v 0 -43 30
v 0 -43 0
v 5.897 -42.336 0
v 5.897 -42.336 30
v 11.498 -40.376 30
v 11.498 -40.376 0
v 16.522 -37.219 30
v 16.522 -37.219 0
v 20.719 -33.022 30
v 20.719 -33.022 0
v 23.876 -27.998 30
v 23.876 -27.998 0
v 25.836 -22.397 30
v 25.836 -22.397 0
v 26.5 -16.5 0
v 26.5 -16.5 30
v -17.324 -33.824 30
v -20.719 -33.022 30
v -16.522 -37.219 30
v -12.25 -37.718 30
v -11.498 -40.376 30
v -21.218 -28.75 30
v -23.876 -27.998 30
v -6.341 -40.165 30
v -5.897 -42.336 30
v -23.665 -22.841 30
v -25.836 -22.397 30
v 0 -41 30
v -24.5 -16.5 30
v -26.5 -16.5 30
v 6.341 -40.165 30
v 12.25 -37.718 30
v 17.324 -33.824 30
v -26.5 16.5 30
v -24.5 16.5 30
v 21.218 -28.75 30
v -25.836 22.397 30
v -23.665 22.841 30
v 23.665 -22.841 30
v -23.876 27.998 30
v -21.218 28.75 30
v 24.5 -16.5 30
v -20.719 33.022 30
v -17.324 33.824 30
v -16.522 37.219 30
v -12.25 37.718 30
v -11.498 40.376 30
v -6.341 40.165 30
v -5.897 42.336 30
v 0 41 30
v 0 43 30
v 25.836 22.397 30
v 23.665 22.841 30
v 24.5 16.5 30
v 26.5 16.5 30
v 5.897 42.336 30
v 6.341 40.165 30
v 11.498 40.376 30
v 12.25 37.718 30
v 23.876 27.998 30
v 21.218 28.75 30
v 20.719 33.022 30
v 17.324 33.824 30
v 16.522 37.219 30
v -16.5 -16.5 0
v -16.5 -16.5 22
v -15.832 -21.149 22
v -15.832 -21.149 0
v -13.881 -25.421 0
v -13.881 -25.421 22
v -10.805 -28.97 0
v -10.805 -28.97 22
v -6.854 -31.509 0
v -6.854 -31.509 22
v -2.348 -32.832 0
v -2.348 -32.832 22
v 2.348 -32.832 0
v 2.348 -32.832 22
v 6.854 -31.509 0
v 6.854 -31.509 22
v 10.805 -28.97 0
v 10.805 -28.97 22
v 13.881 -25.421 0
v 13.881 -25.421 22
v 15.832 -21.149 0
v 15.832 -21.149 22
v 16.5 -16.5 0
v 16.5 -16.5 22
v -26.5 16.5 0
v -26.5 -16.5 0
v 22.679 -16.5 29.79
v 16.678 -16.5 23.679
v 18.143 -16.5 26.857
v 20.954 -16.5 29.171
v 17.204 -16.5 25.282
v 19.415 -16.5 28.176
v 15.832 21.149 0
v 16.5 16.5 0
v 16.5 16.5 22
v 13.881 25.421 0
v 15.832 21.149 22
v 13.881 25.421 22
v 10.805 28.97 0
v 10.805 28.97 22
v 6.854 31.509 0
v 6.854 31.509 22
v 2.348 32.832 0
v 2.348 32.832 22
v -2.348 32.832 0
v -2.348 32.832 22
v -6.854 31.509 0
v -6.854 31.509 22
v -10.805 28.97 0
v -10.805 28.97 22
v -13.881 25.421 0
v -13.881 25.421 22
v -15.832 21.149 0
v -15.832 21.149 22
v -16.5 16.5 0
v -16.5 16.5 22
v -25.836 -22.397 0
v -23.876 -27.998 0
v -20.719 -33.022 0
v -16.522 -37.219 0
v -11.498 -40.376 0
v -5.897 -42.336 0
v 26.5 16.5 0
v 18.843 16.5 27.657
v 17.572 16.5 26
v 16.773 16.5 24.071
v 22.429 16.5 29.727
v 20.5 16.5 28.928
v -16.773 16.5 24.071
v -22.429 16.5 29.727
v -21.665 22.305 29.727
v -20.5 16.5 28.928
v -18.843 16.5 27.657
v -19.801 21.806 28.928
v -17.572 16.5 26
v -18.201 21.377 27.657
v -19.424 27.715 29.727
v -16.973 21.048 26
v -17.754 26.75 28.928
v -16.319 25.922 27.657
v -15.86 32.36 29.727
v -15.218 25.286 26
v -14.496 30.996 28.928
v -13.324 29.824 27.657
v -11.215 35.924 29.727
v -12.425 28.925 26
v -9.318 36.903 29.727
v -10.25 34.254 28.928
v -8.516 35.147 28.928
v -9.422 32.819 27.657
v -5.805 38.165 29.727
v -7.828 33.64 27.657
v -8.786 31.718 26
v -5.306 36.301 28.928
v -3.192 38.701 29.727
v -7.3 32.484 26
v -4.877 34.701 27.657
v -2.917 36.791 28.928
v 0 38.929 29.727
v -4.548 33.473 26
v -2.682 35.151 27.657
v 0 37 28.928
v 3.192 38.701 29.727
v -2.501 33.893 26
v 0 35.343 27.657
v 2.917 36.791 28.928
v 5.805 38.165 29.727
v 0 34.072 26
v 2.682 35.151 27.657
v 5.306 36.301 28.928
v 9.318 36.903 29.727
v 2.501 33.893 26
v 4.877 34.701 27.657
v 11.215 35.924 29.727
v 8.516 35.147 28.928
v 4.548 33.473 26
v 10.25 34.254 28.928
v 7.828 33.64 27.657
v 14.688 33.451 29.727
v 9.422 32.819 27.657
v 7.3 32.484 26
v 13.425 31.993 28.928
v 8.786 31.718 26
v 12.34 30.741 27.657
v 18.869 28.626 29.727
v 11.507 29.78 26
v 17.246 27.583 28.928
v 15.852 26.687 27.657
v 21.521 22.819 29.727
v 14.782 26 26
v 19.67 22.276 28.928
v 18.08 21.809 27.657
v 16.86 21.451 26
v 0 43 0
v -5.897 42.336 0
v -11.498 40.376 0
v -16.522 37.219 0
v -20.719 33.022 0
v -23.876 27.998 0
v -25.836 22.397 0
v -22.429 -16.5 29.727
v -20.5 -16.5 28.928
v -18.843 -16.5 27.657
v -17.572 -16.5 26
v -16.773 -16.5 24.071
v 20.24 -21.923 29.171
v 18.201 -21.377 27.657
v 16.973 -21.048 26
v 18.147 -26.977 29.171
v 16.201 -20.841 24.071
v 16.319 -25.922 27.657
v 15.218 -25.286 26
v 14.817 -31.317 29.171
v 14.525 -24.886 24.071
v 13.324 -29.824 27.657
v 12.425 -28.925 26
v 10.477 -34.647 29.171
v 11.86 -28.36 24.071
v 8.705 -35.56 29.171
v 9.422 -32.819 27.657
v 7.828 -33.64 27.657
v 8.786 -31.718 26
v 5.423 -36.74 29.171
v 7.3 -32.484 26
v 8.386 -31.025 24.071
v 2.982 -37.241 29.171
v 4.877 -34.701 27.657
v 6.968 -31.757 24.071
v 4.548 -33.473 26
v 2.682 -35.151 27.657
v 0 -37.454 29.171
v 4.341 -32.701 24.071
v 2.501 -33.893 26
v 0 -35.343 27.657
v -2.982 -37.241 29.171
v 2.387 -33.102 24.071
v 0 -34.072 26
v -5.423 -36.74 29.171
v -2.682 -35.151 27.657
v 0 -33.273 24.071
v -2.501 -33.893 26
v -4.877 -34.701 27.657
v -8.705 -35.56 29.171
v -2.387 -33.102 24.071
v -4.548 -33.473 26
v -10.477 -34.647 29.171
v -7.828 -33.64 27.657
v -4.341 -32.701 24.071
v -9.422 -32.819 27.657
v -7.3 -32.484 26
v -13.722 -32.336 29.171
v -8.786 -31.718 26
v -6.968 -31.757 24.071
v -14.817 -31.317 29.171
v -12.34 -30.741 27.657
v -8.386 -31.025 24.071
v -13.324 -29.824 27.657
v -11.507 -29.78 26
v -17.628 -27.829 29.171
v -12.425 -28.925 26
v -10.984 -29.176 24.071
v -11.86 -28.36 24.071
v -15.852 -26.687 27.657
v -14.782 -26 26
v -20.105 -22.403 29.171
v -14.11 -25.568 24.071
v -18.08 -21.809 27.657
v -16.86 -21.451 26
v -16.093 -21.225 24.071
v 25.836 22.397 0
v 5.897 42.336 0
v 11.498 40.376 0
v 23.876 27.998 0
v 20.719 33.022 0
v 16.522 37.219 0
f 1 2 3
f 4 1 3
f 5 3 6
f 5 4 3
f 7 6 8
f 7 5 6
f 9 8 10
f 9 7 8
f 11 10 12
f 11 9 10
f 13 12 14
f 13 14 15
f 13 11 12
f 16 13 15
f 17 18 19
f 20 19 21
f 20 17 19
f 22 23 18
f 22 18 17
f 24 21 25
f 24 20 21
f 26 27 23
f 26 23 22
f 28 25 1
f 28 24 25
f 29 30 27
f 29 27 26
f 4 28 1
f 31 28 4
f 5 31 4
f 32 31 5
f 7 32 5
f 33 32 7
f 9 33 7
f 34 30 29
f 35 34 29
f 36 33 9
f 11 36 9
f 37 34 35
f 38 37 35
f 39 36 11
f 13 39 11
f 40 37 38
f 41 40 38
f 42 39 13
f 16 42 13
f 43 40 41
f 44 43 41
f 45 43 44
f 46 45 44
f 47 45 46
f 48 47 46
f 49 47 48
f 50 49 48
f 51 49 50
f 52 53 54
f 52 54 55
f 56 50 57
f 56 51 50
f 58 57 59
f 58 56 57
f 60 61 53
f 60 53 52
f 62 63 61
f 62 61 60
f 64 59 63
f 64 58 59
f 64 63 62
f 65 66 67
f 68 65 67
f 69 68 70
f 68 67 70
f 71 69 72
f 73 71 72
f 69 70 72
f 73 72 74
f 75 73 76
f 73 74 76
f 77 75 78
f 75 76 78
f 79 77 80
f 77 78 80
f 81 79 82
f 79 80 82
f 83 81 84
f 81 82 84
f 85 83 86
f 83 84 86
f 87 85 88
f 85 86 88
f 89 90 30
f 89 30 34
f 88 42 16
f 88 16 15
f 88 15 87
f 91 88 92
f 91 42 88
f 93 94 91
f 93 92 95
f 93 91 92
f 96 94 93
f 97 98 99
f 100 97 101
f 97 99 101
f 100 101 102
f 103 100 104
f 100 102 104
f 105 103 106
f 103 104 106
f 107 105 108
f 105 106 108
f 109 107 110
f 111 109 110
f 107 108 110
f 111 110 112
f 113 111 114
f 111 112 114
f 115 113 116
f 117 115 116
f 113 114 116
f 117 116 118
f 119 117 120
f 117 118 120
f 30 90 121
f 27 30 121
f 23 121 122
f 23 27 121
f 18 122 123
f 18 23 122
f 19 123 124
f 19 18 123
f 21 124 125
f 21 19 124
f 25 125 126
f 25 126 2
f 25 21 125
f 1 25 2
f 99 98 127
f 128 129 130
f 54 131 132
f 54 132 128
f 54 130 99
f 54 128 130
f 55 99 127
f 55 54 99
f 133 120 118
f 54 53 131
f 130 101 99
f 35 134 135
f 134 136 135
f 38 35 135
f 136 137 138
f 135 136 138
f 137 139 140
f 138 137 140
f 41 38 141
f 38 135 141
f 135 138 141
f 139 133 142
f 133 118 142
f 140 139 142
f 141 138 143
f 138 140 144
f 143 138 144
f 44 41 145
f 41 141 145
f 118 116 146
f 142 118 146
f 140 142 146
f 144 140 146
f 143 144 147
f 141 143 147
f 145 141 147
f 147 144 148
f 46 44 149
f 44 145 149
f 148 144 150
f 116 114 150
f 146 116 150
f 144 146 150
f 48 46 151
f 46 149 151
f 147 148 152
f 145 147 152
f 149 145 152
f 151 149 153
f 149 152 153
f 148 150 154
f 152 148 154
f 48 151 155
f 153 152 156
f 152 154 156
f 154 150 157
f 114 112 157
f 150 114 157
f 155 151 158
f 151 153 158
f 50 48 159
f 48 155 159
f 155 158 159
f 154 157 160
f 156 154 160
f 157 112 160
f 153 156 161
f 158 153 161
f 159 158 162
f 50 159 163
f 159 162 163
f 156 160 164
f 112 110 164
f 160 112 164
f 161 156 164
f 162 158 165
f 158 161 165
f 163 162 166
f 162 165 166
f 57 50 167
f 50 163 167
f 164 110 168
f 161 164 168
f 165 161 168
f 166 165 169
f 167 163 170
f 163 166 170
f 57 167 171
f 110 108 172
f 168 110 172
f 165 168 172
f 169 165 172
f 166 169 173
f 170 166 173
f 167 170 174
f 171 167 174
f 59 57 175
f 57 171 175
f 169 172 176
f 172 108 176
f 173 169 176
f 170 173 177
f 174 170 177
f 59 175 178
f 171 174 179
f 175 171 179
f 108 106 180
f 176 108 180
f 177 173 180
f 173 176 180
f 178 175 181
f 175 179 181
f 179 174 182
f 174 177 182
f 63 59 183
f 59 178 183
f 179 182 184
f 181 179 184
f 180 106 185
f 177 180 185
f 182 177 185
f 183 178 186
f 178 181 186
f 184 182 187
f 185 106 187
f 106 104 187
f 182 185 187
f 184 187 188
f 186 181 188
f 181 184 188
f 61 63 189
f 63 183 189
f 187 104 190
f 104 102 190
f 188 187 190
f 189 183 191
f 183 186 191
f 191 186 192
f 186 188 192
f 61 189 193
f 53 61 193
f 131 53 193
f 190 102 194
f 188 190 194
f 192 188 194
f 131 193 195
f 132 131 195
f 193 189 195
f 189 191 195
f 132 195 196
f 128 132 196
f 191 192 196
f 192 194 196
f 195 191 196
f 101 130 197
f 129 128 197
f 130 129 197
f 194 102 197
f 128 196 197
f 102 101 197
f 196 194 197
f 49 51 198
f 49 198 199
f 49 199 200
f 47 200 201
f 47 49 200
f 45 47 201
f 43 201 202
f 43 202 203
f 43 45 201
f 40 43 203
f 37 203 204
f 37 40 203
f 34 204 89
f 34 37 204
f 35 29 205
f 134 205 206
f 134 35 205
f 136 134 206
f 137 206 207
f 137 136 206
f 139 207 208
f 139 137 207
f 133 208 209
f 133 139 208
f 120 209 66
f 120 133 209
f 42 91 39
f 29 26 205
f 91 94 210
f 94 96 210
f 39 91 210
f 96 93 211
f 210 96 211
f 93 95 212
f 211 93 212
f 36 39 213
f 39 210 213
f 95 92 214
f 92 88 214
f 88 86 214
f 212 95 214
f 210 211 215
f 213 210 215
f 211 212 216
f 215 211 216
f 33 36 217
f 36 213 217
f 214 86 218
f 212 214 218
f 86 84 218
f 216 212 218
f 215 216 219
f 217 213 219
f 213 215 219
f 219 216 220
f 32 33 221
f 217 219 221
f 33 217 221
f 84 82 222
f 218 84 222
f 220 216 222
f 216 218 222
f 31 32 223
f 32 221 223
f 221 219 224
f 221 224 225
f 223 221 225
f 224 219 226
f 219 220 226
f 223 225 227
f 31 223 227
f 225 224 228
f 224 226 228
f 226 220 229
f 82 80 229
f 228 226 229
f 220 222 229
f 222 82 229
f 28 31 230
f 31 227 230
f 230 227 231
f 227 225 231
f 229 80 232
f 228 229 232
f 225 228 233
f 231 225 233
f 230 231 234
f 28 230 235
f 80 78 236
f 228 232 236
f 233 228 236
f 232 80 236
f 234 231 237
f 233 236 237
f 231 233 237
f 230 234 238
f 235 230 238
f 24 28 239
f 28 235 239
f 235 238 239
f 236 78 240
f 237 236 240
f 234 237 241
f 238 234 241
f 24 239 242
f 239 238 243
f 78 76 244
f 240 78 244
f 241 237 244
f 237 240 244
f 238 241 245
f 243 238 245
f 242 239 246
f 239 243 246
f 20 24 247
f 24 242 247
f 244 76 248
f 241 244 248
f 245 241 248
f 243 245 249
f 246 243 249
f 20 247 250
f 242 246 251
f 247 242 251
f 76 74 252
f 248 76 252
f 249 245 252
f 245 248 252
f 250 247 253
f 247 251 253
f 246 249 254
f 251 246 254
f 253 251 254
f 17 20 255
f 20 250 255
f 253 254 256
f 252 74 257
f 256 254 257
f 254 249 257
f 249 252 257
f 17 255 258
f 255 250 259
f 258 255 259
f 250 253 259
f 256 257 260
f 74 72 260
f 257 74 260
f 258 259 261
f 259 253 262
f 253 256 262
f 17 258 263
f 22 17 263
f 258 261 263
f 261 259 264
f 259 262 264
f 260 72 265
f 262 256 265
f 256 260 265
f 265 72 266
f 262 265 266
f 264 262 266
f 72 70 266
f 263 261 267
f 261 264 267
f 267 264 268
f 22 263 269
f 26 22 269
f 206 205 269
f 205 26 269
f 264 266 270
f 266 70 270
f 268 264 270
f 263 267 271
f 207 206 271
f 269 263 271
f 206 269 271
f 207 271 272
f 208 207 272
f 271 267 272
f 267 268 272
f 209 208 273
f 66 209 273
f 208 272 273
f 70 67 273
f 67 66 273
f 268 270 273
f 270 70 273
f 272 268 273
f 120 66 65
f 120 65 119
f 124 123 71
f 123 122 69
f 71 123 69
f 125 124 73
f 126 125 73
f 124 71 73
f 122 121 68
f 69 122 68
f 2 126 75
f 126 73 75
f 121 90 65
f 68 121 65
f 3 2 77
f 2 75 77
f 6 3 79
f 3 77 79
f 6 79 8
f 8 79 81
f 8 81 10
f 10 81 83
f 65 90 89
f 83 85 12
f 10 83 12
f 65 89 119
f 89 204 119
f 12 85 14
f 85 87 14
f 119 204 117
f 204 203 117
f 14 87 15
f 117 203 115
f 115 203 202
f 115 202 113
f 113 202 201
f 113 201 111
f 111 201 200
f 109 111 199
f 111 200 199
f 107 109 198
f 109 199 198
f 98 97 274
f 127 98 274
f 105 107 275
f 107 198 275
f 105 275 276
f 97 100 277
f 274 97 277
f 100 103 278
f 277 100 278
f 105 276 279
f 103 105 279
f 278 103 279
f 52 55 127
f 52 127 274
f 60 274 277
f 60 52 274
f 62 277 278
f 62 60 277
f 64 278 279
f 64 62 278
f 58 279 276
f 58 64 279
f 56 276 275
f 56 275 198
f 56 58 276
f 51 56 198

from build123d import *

# Parameters (mm, degrees)
SKETCH_W        = 53
SKETCH_H        = 86
PAD_DEPTH       = 30
POCKET_DEPTH    = 30
POCKET001_DEPTH = 30
POCKET002_DEPTH = 30
POCKET003_DEPTH = 30
POCKET004_DEPTH = 30
FILLET_R        = 8


with BuildPart() as part:
    # Sketch → Pad (new body)
    with BuildSketch(Plane.XY):
        Rectangle(SKETCH_W, SKETCH_H)
    extrude(amount=PAD_DEPTH)

    # Sketch001 (on Face6 of Pad) → Pocket (cut)
    with BuildSketch(Plane.XY.offset(30)):
        with BuildLine():
            ThreePointArc((16.5, 16.5), (0, 33), (-16.5, 16.5))
            Line((-16.5, -16.499996), (-16.5, 16.5))
            ThreePointArc((-16.5, -16.499996), (0, -33), (16.5, -16.499996))
            Line((26.5, -16.499996), (16.5, -16.499996))
            Line((26.5, 16.5), (26.5, -16.499996))
            Line((16.5, 16.5), (26.5, 16.5))
        make_face()
    extrude(amount=-POCKET_DEPTH, mode=Mode.SUBTRACT)

    # Sketch002 (on Face5 of Pocket) → Pocket001 (cut)
    with BuildSketch(Plane.XY.offset(30)):
        with BuildLine():
            ThreePointArc((0, 43), (-18.73833, 35.23833), (-26.5, 16.5))
            Line((-26.5, 16.5), (-26.5, 43))
            Line((-26.5, 43), (0, 43))
        make_face()
    extrude(amount=-POCKET001_DEPTH, mode=Mode.SUBTRACT)

    # Sketch003 (on Face4 of Pocket001) → Pocket002 (cut)
    with BuildSketch(Plane.XY.offset(30)):
        with BuildLine():
            ThreePointArc((26.5, 16.5), (18.73833, 35.23833), (0, 43))
            Line((0, 43), (26.5, 43))
            Line((26.5, 16.5), (26.5, 43))
        make_face()
    extrude(amount=-POCKET002_DEPTH, mode=Mode.SUBTRACT)

    # Sketch004 (on Face4 of Pocket002) → Pocket003 (cut)
    with BuildSketch(Plane.XY.offset(30)):
        with BuildLine():
            ThreePointArc((-26.5, -16.5), (-18.738343, -35.238316), (-3.9e-05, -43))
            Line((-3.9e-05, -43), (-26.5, -43))
            Line((-26.5, -16.5), (-26.5, -43))
        make_face()
    extrude(amount=-POCKET003_DEPTH, mode=Mode.SUBTRACT)

    # Sketch005 (on Face4 of Pocket003) → Pocket004 (cut)
    with BuildSketch(Plane.XY.offset(30)):
        with BuildLine():
            ThreePointArc((3.9e-05, -43), (18.738343, -35.238316), (26.5, -16.5))
            Line((26.5, -16.5), (26.5, -43))
            Line((26.5, -43), (3.9e-05, -43))
        make_face()
    extrude(amount=-POCKET004_DEPTH, mode=Mode.SUBTRACT)

    # Fillet
    fillet_edges = [part.edges().sort_by_distance(p)[0] for p in [
        (-16.5, 2e-06, 30),
    ]]
    fillet(fillet_edges, radius=FILLET_R)


solid = part.part
